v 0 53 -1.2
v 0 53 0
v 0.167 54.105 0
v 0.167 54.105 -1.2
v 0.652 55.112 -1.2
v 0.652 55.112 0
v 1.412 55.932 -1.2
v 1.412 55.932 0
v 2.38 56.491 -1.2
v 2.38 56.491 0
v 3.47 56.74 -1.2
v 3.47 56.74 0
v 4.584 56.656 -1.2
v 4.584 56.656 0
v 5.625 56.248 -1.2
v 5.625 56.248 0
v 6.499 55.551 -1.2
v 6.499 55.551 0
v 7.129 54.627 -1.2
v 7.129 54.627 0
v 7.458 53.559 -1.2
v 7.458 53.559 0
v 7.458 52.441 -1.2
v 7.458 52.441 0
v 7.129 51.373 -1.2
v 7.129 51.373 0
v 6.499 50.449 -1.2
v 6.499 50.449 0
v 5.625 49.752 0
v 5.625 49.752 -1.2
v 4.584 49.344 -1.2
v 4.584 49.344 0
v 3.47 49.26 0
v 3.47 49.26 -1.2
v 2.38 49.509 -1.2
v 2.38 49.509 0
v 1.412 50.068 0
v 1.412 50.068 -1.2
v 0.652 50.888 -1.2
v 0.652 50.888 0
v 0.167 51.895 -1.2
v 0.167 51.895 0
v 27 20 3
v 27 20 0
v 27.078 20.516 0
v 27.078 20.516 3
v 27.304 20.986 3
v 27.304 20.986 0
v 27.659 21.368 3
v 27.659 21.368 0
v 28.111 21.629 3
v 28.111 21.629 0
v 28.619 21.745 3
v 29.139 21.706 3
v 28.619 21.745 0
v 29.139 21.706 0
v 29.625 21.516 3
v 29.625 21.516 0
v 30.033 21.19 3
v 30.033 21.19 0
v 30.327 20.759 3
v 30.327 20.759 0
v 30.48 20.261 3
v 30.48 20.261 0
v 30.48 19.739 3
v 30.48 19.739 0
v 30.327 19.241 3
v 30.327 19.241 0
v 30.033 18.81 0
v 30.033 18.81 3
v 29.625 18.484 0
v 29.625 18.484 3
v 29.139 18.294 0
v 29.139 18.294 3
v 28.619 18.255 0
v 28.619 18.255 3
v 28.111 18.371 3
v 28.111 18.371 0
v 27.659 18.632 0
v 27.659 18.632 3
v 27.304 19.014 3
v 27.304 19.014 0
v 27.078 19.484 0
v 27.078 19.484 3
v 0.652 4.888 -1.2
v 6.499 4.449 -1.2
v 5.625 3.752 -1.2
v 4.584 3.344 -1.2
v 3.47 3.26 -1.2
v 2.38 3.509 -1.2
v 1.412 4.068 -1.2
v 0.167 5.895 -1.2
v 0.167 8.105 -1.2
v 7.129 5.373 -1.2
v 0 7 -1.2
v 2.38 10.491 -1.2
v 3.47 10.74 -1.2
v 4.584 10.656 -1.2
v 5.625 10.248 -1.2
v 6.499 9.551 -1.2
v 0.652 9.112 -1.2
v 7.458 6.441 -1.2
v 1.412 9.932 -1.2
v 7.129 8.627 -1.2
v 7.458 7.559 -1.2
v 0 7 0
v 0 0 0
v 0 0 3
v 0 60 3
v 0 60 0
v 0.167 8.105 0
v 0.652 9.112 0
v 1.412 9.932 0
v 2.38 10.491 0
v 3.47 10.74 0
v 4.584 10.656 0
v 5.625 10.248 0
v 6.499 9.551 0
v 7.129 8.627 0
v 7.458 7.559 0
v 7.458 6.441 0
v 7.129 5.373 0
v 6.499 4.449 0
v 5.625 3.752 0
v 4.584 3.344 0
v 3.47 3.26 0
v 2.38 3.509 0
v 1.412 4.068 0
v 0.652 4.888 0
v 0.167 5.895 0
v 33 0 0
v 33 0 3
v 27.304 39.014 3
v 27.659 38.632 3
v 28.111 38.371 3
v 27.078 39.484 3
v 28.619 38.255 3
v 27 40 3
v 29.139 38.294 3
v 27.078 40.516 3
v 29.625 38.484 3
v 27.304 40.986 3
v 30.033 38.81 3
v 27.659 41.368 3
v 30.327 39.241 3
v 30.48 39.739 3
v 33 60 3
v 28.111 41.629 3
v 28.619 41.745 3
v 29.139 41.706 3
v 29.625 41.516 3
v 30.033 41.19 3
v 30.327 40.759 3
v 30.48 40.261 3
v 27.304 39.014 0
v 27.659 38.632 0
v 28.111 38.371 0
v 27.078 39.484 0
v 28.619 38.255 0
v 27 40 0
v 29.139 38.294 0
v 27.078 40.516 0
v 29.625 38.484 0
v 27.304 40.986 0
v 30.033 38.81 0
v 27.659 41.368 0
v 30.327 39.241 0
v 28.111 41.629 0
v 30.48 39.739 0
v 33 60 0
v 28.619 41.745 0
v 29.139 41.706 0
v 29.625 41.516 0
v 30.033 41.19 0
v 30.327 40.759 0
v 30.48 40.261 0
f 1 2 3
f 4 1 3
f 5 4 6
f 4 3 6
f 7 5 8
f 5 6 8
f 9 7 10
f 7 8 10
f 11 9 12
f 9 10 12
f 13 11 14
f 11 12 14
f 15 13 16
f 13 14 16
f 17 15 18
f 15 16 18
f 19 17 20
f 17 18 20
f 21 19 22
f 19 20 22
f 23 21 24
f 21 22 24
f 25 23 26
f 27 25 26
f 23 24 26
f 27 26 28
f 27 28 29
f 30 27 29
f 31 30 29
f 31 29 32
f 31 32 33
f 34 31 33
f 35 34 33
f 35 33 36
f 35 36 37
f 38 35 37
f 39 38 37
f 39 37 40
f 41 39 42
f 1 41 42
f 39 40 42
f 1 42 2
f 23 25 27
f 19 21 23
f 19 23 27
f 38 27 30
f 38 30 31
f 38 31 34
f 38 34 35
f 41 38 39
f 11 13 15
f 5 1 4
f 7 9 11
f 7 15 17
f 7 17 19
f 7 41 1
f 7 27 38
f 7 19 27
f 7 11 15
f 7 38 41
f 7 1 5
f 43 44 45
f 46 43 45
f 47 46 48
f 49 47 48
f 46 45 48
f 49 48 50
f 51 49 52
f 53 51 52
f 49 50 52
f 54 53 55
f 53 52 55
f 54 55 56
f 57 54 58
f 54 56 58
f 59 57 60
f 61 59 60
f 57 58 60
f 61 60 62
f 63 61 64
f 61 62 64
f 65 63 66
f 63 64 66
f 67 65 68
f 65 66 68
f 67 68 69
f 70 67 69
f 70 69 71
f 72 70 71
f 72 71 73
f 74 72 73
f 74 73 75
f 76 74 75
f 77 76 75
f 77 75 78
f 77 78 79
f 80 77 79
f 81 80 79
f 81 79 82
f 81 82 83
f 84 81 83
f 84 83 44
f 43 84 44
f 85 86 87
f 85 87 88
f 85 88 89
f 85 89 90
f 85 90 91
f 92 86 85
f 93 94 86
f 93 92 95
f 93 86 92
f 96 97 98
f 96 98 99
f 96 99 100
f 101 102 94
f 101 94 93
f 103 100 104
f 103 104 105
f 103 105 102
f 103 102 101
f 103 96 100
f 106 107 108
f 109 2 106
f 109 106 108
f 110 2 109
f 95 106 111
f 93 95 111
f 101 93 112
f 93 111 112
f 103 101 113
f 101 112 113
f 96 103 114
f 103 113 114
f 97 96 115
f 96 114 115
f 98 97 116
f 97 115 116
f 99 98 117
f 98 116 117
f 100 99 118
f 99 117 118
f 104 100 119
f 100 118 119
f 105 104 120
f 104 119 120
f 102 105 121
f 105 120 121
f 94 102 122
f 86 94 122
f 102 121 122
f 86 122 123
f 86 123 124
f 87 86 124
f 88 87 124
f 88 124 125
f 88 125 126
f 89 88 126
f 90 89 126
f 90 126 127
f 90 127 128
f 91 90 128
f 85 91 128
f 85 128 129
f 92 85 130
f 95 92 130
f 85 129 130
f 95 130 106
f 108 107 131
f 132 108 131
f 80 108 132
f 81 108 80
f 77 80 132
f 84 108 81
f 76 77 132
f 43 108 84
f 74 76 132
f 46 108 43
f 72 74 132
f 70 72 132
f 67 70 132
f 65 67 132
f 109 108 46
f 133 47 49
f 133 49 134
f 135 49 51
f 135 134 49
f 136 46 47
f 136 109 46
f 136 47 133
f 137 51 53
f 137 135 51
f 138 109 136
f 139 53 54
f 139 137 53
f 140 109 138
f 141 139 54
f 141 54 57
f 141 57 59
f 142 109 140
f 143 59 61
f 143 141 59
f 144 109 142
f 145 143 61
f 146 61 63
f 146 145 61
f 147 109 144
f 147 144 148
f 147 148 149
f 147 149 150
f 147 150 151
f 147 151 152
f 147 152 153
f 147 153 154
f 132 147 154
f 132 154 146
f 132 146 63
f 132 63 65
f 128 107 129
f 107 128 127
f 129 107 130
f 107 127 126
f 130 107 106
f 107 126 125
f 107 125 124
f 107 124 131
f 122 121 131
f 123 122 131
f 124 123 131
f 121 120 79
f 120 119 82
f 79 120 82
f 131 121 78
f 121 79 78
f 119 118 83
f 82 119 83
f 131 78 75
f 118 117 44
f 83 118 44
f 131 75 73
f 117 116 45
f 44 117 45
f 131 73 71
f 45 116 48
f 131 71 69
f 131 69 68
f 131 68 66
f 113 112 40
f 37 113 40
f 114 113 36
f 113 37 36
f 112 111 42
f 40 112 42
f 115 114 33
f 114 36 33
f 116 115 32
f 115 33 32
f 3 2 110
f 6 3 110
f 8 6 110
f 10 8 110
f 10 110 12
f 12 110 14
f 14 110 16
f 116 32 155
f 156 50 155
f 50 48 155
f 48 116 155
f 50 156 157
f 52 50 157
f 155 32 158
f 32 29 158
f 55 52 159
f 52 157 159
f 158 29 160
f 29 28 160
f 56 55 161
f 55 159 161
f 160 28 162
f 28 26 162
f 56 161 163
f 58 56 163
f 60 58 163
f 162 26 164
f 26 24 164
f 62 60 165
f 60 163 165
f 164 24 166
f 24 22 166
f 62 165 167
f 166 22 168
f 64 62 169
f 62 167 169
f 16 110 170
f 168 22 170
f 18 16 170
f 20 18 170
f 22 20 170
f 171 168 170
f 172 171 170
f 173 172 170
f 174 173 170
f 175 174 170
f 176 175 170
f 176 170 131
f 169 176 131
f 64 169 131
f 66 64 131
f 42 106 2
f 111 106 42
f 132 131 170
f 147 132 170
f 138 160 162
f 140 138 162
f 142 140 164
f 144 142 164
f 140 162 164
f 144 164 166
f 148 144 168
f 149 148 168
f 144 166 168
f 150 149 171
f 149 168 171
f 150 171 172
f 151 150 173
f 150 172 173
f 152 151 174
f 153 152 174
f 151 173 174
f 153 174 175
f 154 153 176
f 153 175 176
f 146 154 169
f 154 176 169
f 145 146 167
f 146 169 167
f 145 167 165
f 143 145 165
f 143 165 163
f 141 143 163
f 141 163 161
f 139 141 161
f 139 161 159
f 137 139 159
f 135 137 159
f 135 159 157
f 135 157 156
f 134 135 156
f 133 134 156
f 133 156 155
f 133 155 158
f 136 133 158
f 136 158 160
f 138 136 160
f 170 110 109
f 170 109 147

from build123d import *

# Parameters (mm, degrees)
ESQUISSE1_W             = 33
ESQUISSE1_H             = 60
BOSS_EXTRU_1_DEPTH      = 3
ESQUISSE3_R             = 3.75
BOSS_EXTRU_2_DEPTH      = 1.2
ESQUISSE4_R             = 1.75
ENL_V_MAT_EXTRU_1_DEPTH = 69.541957953


with BuildPart() as part:
    # Esquisse1 → Boss.-Extru.1 (new body)
    with BuildSketch(Plane.XY):
        with Locations((16.5, 30)):
            Rectangle(ESQUISSE1_W, ESQUISSE1_H)
    extrude(amount=BOSS_EXTRU_1_DEPTH)

    # Esquisse3 → Boss.-Extru.2 (add)
    with BuildSketch(Plane(origin=(0, 0, 0), x_dir=(-1, 0, 0), z_dir=(0, 0, -1))):
        with Locations((-3.75, 53)):
            Circle(ESQUISSE3_R)
        with Locations((-3.75, 7)):
            Circle(ESQUISSE3_R)
    extrude(amount=BOSS_EXTRU_2_DEPTH)

    # Esquisse4 → Enlèv. mat.-Extru.1 (cut, through all)
    with BuildSketch(Plane(origin=(0, 0, 0), x_dir=(-1, 0, 0), z_dir=(0, 0, -1))):
        with Locations((-28.75, 40)):
            Circle(ESQUISSE4_R)
        with Locations((-28.75, 20)):
            Circle(ESQUISSE4_R)
    extrude(amount=-ENL_V_MAT_EXTRU_1_DEPTH, mode=Mode.SUBTRACT)


solid = part.part
